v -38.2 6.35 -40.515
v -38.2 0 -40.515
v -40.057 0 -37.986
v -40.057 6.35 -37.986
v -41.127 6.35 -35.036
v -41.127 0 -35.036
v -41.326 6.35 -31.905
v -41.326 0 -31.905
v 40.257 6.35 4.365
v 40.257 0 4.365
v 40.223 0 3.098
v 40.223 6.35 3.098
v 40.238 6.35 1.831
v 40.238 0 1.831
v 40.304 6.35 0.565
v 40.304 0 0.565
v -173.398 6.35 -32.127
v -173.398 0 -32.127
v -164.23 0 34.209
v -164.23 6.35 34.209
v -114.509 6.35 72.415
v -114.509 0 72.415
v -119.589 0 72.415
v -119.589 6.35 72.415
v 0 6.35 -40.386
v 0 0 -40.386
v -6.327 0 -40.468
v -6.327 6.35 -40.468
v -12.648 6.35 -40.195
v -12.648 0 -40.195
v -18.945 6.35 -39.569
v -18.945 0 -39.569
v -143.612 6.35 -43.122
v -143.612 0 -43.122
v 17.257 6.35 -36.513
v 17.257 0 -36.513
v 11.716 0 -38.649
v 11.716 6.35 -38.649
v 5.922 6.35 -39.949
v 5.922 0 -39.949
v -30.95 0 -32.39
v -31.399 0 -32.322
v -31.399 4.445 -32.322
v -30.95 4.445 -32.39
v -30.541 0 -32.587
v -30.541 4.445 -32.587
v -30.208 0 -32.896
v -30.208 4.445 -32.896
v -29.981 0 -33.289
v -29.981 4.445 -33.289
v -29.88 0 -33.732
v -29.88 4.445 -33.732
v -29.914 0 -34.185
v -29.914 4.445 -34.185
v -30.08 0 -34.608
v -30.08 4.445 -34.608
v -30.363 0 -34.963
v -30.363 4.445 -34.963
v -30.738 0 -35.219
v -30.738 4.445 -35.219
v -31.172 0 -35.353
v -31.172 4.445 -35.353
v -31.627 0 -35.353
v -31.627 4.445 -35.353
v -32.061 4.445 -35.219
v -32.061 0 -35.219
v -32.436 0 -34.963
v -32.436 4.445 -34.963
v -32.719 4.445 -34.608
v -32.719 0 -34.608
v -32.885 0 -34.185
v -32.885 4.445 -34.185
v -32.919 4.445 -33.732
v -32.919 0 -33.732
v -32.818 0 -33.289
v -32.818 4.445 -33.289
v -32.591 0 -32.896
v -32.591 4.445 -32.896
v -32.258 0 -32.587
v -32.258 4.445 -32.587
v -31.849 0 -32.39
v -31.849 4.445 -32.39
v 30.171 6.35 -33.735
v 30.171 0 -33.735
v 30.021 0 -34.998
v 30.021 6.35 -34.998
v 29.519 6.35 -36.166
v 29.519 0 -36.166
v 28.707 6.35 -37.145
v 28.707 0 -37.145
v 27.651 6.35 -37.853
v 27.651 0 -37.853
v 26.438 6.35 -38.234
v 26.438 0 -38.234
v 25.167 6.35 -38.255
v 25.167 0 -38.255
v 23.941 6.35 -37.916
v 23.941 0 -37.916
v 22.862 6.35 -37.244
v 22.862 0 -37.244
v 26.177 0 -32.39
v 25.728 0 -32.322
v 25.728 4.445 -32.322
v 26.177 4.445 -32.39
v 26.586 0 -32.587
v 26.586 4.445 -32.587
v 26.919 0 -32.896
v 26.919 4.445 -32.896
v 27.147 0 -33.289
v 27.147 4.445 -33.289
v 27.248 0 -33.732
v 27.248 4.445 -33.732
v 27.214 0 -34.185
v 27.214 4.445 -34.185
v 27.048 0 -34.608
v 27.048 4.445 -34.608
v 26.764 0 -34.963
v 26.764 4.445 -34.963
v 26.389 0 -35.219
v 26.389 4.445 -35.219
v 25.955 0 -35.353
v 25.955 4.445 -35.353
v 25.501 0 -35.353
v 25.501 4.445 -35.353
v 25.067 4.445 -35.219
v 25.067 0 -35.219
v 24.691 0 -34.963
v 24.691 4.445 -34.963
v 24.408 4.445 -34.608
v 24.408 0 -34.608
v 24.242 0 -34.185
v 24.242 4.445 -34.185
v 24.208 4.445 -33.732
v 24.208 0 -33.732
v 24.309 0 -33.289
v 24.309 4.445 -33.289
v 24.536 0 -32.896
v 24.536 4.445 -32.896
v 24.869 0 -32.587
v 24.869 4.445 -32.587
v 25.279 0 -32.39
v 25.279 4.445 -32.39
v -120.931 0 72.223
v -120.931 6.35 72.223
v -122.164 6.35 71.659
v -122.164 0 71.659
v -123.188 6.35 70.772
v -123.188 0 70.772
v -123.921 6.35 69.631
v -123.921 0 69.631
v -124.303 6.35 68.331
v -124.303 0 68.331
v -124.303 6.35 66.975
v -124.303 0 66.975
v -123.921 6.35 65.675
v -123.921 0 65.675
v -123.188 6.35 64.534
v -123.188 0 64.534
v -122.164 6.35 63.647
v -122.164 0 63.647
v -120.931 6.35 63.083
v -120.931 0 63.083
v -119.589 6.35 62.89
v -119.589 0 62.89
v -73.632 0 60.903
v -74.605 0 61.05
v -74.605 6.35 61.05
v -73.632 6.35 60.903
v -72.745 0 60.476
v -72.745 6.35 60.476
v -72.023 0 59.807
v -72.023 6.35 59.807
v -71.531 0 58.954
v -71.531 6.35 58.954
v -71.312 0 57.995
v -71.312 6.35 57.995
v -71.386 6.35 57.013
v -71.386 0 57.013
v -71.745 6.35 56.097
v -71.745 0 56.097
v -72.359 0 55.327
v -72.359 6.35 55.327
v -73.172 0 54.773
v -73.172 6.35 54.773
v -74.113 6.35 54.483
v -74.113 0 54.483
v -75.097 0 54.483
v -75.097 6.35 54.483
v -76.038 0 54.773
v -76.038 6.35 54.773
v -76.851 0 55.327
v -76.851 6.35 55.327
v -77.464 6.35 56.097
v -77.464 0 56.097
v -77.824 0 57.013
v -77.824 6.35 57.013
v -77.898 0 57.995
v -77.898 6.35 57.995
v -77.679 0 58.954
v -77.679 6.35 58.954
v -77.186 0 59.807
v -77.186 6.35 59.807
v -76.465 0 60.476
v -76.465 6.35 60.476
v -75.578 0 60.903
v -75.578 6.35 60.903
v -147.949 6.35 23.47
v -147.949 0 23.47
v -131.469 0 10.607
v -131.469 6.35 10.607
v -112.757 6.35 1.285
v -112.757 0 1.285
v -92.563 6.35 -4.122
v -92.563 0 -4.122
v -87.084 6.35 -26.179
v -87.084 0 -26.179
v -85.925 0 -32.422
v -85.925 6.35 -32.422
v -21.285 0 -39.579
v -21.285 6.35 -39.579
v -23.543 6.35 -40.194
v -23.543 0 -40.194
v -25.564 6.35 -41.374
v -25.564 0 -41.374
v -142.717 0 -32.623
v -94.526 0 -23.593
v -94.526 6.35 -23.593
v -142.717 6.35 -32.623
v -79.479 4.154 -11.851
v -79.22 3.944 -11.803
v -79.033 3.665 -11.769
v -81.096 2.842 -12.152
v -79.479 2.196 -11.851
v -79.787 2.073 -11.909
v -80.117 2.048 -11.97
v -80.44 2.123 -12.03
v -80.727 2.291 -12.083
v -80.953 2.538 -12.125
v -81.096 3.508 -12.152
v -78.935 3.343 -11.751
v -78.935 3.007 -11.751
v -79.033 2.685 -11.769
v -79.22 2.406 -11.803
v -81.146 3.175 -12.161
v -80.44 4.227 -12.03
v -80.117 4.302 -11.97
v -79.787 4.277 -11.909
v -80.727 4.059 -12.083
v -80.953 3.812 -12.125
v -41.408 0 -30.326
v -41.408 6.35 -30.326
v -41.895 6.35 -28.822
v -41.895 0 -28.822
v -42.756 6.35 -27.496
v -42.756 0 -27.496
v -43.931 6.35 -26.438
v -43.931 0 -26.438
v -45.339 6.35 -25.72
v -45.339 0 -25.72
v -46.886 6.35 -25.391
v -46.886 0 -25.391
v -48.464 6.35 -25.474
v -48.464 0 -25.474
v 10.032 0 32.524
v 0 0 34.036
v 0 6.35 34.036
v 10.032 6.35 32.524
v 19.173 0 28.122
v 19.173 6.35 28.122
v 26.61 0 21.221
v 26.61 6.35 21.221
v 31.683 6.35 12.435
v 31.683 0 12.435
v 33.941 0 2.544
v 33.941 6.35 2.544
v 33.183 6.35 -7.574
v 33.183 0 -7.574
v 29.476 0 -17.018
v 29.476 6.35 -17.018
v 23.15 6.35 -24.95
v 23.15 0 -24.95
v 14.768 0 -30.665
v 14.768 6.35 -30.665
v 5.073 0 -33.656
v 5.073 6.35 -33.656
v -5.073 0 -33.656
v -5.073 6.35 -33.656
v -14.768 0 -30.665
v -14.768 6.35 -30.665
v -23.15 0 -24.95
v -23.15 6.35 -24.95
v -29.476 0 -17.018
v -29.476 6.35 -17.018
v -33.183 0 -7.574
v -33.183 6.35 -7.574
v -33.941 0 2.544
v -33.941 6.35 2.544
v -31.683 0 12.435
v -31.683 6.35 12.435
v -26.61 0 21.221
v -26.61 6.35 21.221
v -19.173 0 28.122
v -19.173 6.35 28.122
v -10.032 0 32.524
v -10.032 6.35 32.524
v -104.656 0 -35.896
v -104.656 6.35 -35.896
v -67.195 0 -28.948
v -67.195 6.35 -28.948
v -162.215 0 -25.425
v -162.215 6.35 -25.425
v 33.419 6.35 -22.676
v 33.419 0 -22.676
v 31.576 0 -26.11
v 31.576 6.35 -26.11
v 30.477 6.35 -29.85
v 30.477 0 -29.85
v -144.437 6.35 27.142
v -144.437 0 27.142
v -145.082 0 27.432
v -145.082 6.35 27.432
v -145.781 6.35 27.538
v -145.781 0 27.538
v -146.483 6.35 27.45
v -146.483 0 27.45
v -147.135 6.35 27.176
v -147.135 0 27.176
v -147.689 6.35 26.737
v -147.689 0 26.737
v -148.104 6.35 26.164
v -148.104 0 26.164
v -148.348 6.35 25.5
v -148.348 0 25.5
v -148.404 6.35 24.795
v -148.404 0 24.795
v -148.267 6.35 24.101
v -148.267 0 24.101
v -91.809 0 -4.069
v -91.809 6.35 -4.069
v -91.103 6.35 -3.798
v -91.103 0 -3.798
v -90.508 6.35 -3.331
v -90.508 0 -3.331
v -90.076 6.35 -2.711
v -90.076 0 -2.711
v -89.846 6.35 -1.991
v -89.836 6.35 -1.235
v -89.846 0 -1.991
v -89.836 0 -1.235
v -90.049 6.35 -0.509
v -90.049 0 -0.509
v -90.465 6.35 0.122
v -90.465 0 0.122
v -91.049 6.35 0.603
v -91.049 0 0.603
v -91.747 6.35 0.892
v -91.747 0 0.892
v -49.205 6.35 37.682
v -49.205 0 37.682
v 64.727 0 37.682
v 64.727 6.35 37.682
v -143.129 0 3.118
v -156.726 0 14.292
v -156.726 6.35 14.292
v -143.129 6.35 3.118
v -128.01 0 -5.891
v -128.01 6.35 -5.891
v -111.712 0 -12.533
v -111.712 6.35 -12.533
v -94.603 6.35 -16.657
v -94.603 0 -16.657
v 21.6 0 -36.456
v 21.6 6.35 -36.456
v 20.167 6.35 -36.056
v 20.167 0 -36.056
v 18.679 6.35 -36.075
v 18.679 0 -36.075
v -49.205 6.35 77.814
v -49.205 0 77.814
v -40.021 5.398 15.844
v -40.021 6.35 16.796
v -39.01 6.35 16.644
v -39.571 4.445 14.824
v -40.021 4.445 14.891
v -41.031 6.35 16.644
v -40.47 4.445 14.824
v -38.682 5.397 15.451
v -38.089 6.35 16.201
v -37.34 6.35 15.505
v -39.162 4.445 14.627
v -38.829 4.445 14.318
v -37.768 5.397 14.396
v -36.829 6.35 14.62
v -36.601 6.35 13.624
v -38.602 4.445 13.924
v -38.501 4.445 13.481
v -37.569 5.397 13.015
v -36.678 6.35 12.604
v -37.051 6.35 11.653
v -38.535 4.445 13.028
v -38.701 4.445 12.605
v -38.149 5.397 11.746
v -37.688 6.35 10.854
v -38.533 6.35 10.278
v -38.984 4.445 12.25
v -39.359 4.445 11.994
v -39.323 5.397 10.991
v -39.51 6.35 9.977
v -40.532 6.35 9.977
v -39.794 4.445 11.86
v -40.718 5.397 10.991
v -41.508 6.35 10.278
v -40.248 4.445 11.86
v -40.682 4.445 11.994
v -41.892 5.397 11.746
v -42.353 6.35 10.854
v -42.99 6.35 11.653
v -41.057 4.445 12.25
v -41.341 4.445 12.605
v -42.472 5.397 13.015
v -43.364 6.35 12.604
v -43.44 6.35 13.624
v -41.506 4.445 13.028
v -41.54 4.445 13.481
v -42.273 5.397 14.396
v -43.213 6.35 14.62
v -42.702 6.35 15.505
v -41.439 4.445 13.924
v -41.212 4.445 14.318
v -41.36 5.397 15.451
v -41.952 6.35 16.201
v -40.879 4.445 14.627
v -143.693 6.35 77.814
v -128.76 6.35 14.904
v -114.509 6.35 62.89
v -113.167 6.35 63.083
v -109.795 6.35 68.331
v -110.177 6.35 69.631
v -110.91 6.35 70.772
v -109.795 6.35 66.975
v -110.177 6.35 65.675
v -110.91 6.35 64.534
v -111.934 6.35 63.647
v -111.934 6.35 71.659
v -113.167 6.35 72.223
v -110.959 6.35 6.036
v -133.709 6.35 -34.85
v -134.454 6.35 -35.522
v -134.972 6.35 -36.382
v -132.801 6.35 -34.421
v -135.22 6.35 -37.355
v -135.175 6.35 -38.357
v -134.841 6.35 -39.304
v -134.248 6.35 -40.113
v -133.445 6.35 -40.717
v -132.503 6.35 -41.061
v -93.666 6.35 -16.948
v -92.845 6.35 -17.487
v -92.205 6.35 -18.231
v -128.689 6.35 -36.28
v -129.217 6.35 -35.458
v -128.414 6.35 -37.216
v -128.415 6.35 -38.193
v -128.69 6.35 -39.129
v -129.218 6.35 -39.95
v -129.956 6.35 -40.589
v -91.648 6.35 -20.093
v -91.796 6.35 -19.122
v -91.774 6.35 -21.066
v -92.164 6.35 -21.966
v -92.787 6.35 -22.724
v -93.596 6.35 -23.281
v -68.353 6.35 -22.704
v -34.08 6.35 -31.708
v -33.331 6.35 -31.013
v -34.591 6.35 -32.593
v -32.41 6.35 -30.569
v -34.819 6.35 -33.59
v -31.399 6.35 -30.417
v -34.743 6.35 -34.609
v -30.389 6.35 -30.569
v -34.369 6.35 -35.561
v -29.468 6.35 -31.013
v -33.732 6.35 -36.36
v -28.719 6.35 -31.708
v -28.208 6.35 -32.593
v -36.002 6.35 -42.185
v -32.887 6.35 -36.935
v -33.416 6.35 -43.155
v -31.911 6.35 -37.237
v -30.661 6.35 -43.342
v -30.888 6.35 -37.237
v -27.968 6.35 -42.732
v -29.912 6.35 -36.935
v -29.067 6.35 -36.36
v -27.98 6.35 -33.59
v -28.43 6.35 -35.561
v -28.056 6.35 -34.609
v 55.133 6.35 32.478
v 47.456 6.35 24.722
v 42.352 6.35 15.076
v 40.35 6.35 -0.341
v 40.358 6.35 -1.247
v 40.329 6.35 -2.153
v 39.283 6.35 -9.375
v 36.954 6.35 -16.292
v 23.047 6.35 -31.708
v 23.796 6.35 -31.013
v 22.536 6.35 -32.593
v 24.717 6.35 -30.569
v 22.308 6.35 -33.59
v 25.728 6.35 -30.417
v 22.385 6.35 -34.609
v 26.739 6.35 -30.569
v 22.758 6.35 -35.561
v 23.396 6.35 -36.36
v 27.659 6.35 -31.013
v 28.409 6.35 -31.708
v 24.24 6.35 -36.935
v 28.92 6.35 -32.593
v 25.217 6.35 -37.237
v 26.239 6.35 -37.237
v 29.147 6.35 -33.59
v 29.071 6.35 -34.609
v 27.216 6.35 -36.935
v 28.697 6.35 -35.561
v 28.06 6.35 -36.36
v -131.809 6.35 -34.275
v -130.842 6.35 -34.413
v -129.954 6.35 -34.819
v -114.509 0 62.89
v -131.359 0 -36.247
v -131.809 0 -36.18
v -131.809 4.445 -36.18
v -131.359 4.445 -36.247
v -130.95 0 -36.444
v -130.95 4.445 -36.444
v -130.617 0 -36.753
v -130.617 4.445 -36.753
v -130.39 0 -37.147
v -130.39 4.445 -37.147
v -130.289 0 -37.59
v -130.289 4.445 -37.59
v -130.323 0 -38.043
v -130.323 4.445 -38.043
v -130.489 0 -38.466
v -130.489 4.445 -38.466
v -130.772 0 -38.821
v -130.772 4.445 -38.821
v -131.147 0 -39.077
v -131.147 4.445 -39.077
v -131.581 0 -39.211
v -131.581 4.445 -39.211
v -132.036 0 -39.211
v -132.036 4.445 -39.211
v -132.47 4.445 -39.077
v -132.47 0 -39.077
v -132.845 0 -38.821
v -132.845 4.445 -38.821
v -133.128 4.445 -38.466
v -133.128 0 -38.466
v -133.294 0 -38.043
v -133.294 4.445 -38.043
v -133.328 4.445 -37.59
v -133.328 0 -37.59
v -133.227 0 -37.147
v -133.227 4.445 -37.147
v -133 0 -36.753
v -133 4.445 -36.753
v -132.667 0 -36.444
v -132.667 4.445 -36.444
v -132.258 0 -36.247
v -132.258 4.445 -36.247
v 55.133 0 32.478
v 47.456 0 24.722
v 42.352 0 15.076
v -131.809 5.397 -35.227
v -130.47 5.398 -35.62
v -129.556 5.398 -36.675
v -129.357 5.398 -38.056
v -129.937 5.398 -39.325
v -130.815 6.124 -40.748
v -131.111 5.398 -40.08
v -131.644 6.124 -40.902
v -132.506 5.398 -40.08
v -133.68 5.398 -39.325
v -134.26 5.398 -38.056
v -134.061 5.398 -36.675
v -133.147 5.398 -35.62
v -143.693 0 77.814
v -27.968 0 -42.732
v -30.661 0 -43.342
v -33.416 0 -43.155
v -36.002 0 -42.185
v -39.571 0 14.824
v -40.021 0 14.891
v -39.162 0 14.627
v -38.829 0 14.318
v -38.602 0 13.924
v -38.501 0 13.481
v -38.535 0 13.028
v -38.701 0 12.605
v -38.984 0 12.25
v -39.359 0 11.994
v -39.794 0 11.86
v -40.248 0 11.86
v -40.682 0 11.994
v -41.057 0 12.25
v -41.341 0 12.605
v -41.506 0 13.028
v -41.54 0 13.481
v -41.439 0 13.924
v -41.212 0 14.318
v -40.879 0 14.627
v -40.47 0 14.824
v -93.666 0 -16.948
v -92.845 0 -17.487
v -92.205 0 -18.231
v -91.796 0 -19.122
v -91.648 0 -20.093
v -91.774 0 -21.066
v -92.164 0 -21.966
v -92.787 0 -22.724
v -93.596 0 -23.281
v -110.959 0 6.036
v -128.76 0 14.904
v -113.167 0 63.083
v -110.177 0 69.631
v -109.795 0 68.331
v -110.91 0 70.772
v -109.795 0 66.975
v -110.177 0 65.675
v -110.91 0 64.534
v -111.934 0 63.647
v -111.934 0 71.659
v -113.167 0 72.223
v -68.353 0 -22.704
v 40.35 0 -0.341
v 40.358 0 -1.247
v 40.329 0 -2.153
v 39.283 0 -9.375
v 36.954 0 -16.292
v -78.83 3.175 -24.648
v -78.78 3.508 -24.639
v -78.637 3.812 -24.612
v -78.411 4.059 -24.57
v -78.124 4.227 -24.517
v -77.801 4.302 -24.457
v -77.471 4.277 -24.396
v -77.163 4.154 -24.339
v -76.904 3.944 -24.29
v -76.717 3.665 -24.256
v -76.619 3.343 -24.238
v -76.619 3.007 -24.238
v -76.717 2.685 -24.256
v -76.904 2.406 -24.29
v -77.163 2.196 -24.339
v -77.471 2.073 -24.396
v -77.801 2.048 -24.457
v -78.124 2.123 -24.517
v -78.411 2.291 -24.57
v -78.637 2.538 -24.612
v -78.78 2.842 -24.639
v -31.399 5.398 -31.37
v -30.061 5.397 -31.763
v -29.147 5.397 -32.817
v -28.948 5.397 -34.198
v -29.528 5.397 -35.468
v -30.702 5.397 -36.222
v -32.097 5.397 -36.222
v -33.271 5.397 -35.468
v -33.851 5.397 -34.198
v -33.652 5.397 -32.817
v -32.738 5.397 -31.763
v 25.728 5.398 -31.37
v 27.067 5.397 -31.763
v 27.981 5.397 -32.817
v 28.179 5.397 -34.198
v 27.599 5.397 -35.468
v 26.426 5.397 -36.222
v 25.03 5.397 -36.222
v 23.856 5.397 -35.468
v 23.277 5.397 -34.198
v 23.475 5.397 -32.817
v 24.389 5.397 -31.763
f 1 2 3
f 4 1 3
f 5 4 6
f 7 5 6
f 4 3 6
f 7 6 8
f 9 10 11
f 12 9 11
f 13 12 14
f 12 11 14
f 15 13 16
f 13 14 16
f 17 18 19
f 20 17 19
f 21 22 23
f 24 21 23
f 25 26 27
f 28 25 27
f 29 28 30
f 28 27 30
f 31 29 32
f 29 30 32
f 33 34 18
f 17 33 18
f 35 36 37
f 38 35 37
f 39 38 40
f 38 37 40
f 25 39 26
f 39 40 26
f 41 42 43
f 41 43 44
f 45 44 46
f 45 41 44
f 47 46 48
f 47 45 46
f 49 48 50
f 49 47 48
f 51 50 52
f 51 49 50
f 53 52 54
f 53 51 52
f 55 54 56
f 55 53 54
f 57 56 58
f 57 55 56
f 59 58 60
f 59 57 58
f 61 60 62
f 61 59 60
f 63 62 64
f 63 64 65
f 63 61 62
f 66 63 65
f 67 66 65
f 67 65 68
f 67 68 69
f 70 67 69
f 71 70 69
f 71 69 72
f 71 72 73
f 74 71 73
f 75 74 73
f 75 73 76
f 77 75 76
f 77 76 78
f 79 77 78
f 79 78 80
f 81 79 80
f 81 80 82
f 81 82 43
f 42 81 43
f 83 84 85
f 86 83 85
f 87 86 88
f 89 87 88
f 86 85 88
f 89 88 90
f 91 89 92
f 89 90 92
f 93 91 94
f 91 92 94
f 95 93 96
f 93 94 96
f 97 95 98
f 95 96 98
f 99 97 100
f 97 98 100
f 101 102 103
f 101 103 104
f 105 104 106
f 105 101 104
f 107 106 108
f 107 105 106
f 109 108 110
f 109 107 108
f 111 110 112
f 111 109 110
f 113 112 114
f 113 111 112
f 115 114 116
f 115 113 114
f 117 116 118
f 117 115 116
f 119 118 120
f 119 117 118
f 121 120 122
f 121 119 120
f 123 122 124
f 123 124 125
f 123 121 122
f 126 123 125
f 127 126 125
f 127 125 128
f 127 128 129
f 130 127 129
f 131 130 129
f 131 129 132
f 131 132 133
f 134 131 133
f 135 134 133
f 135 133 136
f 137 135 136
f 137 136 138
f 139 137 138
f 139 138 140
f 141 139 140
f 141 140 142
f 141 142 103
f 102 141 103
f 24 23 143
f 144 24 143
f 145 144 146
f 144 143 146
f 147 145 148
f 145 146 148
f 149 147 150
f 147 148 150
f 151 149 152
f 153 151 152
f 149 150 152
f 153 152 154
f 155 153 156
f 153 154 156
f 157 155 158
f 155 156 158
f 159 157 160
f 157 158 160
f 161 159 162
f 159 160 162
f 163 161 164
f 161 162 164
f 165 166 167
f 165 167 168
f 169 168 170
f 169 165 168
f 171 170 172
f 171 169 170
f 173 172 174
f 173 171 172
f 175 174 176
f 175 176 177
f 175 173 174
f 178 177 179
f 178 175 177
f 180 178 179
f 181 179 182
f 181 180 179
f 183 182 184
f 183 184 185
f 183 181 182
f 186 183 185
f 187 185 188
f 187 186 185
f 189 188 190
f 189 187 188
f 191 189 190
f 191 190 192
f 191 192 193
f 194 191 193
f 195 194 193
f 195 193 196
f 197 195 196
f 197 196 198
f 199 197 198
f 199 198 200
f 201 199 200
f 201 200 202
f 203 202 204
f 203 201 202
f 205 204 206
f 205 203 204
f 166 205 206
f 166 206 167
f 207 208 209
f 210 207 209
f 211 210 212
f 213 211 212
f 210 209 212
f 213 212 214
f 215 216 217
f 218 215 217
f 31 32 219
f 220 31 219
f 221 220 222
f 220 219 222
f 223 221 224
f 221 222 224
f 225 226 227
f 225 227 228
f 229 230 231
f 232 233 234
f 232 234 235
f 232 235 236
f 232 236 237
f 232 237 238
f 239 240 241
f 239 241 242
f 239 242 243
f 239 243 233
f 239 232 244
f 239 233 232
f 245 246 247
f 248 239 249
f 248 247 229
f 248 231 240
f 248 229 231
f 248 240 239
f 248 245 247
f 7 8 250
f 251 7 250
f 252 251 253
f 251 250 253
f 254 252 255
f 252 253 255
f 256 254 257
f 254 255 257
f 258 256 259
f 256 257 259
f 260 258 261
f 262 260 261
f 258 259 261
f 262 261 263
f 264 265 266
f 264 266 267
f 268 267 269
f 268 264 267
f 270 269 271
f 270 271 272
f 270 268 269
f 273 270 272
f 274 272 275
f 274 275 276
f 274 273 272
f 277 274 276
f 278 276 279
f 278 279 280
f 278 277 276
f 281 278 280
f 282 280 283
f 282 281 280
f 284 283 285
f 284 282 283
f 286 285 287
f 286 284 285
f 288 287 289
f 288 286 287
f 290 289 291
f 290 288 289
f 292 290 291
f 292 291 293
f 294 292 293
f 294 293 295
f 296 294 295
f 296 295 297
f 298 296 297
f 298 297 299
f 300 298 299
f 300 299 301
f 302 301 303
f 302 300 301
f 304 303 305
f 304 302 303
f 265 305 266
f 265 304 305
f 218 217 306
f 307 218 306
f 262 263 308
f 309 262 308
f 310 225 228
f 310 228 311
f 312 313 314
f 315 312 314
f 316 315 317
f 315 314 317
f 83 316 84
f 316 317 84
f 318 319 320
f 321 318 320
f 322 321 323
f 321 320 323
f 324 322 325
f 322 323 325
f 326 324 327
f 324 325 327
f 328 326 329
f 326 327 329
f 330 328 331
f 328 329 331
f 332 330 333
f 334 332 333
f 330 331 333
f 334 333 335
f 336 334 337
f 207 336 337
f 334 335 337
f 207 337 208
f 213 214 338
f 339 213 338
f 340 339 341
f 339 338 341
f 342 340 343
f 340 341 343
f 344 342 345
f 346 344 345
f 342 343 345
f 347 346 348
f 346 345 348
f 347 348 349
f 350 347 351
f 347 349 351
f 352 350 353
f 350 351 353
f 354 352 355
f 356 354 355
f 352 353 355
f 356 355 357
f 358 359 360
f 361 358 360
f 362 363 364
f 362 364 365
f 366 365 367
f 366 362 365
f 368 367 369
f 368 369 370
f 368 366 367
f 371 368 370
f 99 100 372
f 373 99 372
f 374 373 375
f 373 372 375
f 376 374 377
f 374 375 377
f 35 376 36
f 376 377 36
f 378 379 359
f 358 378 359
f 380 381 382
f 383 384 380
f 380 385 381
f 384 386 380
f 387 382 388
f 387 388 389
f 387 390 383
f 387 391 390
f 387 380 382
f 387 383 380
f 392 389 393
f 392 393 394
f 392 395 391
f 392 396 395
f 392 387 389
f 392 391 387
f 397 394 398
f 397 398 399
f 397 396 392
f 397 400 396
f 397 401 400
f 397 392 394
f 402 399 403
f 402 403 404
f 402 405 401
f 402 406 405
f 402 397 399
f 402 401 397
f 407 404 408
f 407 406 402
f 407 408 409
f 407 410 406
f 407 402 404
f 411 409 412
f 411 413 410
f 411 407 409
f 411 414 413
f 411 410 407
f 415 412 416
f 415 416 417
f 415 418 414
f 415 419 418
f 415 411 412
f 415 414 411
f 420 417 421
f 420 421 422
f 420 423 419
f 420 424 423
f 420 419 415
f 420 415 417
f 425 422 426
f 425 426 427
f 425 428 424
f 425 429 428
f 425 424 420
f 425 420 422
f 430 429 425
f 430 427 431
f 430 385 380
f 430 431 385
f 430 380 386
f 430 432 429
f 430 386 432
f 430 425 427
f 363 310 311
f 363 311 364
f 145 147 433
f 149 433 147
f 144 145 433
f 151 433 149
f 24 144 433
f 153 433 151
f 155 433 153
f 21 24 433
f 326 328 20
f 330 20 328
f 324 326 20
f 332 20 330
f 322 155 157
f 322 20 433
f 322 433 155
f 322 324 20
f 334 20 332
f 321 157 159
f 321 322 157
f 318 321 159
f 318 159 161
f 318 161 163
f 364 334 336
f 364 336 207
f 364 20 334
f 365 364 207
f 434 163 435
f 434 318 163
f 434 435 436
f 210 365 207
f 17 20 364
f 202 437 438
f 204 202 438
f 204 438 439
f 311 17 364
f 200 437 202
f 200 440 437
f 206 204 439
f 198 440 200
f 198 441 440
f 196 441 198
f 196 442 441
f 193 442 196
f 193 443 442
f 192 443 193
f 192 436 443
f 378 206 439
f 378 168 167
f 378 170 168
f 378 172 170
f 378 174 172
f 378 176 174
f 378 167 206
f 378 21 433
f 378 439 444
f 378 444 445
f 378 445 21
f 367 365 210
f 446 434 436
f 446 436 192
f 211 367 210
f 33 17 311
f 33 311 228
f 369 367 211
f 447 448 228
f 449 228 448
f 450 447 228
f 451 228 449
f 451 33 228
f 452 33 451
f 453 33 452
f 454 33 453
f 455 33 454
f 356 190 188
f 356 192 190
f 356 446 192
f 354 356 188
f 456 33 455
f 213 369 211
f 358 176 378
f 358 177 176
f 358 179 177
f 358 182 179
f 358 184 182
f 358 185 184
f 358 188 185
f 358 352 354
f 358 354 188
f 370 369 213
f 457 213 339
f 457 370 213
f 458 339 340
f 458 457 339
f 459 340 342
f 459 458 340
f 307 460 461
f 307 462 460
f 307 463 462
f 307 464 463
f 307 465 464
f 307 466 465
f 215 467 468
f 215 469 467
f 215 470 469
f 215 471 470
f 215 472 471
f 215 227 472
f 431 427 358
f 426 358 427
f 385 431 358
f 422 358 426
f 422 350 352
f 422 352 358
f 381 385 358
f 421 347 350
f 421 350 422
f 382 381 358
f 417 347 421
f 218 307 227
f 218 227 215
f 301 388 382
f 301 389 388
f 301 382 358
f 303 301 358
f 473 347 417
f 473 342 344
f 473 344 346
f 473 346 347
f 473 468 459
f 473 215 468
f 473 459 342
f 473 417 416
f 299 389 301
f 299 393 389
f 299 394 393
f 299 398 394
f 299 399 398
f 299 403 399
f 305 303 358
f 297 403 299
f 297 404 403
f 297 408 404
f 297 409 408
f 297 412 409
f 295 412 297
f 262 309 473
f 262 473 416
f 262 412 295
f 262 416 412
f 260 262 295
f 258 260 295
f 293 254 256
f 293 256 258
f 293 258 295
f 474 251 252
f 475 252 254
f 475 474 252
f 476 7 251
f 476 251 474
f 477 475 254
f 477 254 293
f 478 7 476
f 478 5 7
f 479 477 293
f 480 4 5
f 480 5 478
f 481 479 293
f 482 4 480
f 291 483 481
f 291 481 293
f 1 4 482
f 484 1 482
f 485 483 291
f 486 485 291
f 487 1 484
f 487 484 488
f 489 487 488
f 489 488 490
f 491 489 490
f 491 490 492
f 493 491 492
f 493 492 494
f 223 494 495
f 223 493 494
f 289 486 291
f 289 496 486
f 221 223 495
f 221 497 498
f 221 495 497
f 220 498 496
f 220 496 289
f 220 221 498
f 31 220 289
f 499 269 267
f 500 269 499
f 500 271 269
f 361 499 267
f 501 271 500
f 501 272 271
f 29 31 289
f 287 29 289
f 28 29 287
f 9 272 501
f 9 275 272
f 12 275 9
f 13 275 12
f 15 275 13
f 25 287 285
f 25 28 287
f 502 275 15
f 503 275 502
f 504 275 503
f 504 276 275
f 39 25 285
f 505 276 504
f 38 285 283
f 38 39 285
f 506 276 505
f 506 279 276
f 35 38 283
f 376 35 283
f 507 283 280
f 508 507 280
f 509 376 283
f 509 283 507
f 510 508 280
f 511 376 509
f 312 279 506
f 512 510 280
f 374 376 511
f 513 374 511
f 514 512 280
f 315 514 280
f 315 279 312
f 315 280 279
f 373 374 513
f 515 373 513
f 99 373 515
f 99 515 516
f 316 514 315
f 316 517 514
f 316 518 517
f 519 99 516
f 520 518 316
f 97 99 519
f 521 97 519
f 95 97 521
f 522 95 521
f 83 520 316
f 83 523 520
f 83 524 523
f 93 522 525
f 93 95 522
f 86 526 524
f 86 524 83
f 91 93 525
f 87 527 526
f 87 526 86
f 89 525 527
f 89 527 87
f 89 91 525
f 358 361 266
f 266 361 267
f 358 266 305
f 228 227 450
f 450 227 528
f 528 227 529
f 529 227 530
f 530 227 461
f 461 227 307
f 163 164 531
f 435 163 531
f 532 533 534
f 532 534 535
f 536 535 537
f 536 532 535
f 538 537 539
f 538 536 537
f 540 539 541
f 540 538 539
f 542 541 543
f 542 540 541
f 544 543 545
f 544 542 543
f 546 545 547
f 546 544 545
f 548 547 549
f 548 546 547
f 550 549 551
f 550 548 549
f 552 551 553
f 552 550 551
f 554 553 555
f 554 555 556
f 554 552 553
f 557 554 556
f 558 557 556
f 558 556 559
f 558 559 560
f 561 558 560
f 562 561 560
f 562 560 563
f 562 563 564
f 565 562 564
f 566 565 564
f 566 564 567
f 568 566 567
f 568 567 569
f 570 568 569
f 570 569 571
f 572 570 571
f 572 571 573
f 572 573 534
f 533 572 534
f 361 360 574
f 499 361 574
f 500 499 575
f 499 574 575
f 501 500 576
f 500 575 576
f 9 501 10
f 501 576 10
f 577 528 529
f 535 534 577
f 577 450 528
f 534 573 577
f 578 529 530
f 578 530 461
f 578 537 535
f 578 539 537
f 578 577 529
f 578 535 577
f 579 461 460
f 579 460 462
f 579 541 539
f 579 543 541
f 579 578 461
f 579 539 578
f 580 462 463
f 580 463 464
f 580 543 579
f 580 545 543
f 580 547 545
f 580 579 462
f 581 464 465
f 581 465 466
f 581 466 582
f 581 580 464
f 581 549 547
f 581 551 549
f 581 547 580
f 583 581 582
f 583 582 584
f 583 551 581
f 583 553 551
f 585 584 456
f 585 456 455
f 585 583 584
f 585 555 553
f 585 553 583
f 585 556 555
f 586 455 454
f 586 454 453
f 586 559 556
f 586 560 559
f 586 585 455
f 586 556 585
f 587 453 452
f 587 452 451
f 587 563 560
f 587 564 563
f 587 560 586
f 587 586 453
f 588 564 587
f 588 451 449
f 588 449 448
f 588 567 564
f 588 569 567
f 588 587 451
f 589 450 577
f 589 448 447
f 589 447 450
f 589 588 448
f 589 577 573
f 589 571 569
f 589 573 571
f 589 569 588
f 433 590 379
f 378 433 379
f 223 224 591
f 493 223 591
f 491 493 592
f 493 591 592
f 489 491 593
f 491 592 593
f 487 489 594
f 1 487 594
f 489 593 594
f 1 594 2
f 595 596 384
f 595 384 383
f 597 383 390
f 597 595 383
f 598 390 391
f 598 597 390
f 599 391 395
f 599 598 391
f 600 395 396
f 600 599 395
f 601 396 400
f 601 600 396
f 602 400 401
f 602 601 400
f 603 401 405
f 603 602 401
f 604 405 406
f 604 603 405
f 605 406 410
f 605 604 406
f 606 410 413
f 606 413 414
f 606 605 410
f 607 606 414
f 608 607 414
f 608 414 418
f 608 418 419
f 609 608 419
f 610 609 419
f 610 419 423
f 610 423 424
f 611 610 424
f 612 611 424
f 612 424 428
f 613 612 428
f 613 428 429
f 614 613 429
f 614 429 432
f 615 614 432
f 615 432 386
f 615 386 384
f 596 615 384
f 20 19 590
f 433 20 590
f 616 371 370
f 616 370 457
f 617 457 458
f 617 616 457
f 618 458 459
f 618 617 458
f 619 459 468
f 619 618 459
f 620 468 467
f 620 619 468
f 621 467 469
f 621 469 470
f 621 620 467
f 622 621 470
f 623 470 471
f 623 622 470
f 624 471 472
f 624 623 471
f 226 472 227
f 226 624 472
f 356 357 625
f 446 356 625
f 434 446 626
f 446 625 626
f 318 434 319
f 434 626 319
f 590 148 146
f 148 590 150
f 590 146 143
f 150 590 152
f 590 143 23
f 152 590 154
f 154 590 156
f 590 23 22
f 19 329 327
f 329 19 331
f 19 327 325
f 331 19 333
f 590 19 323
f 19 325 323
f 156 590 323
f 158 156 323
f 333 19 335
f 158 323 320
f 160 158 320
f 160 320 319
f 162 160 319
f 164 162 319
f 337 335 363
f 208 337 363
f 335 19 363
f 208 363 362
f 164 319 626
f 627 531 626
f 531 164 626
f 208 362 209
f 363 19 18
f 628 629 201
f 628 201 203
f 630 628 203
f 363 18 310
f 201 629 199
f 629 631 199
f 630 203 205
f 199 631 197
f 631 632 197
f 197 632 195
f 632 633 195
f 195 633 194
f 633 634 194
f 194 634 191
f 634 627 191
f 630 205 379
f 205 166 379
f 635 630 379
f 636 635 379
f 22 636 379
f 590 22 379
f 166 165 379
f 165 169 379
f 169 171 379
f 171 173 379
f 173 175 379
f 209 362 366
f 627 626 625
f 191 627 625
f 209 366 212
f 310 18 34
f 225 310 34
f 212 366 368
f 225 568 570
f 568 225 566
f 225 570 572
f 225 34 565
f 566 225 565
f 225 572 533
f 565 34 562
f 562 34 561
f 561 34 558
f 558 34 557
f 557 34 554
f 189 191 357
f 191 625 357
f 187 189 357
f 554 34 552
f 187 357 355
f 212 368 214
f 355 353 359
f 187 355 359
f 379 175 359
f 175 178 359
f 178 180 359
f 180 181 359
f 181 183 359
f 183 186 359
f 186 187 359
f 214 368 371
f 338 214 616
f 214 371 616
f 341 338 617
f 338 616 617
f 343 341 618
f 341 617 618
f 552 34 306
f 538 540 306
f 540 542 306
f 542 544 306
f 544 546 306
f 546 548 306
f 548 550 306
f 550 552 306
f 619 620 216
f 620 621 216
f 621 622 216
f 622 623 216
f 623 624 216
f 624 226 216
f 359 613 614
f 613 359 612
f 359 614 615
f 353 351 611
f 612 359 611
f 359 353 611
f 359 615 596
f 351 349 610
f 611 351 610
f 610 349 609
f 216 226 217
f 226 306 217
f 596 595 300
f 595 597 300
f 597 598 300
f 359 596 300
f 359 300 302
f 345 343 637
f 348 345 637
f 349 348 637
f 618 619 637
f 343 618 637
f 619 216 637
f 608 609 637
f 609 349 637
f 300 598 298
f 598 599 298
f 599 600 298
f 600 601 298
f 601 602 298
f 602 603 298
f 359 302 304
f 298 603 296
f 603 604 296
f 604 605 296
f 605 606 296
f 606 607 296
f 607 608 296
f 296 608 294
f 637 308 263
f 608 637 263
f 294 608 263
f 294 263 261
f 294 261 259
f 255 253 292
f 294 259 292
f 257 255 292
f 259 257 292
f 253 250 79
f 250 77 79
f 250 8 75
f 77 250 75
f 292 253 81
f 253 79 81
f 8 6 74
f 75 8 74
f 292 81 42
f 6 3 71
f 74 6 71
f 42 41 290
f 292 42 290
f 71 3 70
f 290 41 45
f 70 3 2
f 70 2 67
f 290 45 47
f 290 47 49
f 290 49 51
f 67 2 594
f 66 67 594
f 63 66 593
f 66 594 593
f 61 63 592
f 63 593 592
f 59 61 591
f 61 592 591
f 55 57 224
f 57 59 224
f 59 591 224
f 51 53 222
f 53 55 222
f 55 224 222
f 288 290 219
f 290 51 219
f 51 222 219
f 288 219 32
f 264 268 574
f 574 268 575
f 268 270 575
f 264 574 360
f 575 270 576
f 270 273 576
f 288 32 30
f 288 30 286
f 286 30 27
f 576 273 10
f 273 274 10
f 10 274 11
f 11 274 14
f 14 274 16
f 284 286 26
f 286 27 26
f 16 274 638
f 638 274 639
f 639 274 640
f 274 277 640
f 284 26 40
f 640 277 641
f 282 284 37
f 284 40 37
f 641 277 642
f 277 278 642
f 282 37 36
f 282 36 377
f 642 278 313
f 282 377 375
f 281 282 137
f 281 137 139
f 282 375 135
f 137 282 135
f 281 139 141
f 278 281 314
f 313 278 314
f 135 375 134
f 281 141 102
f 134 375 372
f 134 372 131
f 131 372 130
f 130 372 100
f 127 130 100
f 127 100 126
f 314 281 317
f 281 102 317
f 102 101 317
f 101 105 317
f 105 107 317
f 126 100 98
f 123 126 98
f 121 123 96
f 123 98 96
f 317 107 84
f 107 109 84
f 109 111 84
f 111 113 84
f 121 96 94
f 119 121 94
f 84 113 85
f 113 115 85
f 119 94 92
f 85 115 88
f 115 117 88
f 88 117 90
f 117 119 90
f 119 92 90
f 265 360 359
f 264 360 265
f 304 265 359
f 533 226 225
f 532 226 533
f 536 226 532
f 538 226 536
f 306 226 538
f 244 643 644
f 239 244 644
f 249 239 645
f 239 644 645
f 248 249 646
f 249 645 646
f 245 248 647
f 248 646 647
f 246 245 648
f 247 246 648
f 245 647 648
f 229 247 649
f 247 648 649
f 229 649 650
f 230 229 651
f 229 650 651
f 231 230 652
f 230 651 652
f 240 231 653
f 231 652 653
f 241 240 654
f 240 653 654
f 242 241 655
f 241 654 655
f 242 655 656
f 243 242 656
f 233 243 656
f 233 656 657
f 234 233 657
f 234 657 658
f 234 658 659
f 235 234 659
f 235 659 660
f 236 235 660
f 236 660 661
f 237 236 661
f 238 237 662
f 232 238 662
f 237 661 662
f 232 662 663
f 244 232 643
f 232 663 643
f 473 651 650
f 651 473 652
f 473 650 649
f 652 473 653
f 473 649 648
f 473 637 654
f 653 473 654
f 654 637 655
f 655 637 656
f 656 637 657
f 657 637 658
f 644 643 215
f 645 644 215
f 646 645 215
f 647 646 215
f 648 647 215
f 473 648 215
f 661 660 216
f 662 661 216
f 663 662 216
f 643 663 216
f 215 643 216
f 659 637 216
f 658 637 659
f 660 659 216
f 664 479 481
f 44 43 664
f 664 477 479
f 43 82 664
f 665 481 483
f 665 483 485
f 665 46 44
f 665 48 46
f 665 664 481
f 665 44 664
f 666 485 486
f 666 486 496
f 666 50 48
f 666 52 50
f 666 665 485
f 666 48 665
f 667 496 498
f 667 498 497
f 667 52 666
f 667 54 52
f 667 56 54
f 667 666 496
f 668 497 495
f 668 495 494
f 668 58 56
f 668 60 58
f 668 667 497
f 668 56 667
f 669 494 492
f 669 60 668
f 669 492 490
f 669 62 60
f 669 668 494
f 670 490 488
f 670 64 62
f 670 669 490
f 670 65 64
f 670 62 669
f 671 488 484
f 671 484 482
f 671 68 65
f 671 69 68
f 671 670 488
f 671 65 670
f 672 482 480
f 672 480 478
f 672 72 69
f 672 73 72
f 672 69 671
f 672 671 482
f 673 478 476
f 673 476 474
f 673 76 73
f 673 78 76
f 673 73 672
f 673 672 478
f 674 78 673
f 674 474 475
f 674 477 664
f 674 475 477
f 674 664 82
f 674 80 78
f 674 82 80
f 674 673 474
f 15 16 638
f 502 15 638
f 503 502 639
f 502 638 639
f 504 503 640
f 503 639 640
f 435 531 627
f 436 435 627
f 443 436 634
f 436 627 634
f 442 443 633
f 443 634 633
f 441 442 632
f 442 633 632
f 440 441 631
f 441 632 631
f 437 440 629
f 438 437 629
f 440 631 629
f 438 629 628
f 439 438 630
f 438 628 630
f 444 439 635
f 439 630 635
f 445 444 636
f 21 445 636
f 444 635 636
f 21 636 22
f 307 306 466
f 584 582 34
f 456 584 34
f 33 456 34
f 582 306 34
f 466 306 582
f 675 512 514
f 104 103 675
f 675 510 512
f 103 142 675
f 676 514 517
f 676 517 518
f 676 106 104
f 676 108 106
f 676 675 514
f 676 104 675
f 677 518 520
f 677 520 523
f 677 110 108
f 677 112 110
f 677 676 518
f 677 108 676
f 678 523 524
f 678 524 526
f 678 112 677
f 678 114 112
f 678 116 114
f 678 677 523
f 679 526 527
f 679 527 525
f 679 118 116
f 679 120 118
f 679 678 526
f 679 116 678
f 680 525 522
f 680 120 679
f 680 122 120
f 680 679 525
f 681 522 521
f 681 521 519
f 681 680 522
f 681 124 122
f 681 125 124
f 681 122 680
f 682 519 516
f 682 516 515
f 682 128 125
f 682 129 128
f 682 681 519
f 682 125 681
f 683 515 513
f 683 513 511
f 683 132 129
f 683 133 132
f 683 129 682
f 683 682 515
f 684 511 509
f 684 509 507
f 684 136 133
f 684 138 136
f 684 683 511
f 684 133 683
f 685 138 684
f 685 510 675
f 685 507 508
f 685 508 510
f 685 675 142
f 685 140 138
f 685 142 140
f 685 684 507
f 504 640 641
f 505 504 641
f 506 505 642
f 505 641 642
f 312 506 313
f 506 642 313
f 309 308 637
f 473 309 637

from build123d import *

# Parameters (mm, degrees)
SKETCH1_R           = 34.036
SKETCH1_R_2         = 1.524
SKETCH1_R_3         = 3.302
BOSS_EXTRUDE1_DEPTH = 6.35
CHAMFER1_SIZE       = 1.905
SKETCH2_R           = 1.1303
CUT_EXTRUDE1_DEPTH  = 12.7


with BuildPart() as part:
    # Sketch1 → Boss-Extrude1 (new body)
    with BuildSketch(Plane(origin=(0, 0, 0), x_dir=(1, 0, 0), z_dir=(0, 1, 0))):
        with BuildLine():
            Line((-48.464441263, 25.473804408), (-67.194964824, 28.947993109))
            Line((-67.194964824, 28.947993109), (-68.353027724, 22.704485256))
            Line((-68.353027724, 22.704485256), (-87.083551285, 26.178673957))
            Line((-87.083551285, 26.178673957), (-85.925488385, 32.42218181))
            Line((-85.925488385, 32.42218181), (-104.656011946, 35.896370512))
            Line((-104.656011946, 35.896370512), (-123.386535507, 39.370559213))
            Line((-123.386535507, 39.370559213), (-143.61245558, 43.122118146))
            Line((-143.61245558, 43.122118146), (-173.397808446, 32.12688033))
            Line((-173.397808446, 32.12688033), (-164.230158466, -34.209448348))
            Line((-164.230158466, -34.209448348), (-143.692879271, -77.813892282))
            Line((-143.692879271, -77.813892282), (-76.563330949, -77.813892282))
            Line((-76.563330949, -77.813892282), (-49.204879271, -77.813892282))
            Line((-49.204879271, -77.813892282), (-49.204879271, -37.681892282))
            Line((-49.204879271, -37.681892282), (45.277962712, -37.681892282))
            Line((45.277962712, -37.681892282), (64.72671994, -37.681892282))
            ThreePointArc((64.72671994, -37.681892282), (47.456106683, -24.721818432), (40.256527969, -4.364911427))
            ThreePointArc((40.256527969, -4.364911427), (40.224315343, -2.464216219), (40.304028245, -0.564920092))
            ThreePointArc((40.304028245, -0.564920092), (40.358687129, 0.79375425), (40.328560009, 2.153193811))
            ThreePointArc((40.328560009, 2.153193811), (38.274981353, 12.886225143), (33.41911498, 22.675796567))
            ThreePointArc((33.41911498, 22.675796567), (30.929713329, 27.951337515), (30.171477502, 33.73524029))
            ThreePointArc((30.171477502, 33.73524029), (27.651370412, 37.853265988), (22.862043617, 37.243820127))
            ThreePointArc((22.862043617, 37.243820127), (20.166682607, 36.055874133), (17.256896531, 36.513401897))
            ThreePointArc((17.256896531, 36.513401897), (8.843040964, 39.405959226), (0, 40.386))
            ThreePointArc((0, 40.386), (-9.489488111, 40.375548652), (-18.94466273, 39.569219451))
            ThreePointArc((-18.94466273, 39.569219451), (-22.43398811, 39.812343861), (-25.563809609, 41.373983535))
            ThreePointArc((-25.563809609, 41.373983535), (-32.045487778, 43.349075748), (-38.20024979, 40.514989348))
            ThreePointArc((-38.20024979, 40.514989348), (-40.697264896, 36.549064779), (-41.325740518, 31.904857578))
            ThreePointArc((-41.325740518, 31.904857578), (-43.308574881, 26.928241056), (-48.464441263, 25.473804408))
        make_face()
        with Locations(Location((0, 0, 0), (0, 0, 270))):
            Circle(SKETCH1_R, mode=Mode.SUBTRACT)
        with Locations(Location((-31.399492492, 33.846007028, 0), (0, 0, 270))):
            Circle(SKETCH1_R_2, mode=Mode.SUBTRACT)
        with Locations(Location((-74.604879271, -57.747892282, 0), (0, 0, 270))):
            Circle(SKETCH1_R_3, mode=Mode.SUBTRACT)
        with Locations(Location((-40.020695033, -13.367428306, 0), (0, 0, 270))):
            Circle(SKETCH1_R_2, mode=Mode.SUBTRACT)
        with Locations(Location((-131.808500509, 37.703534036, 0), (0, 0, 270))):
            Circle(SKETCH1_R_2, mode=Mode.SUBTRACT)
        with Locations(Location((25.727857837, 33.846007028, 0), (0, 0, 270))):
            Circle(SKETCH1_R_2, mode=Mode.SUBTRACT)
        with BuildLine():
            Line((-142.716614997, 32.622661546), (-162.215024971, 25.424839997))
            Line((-162.215024971, 25.424839997), (-156.726187502, -14.291916989))
            ThreePointArc((-156.726187502, -14.291916989), (-128.010283659, 5.891204619), (-94.602827713, 16.657049623))
            ThreePointArc((-94.602827713, 16.657049623), (-91.648252867, 20.09262068), (-94.526212577, 23.592621954))
            Line((-94.526212577, 23.592621954), (-142.716614997, 32.622661546))
        make_face(mode=Mode.SUBTRACT)
        with BuildLine():
            Line((-114.508797405, -72.415483536), (-119.588797405, -72.415483536))
            ThreePointArc((-119.588797405, -72.415483536), (-124.351297405, -67.652983536), (-119.588797405, -62.890483536))
            Line((-119.588797405, -62.890483536), (-114.508797405, -62.890483536))
            ThreePointArc((-114.508797405, -62.890483536), (-109.746297405, -67.652983536), (-114.508797405, -72.415483536))
        make_face(mode=Mode.SUBTRACT)
        with BuildLine():
            ThreePointArc((-147.948535824, -23.470306336), (-122.347176599, -5.47625853), (-92.563113904, 4.121916294))
            ThreePointArc((-92.563113904, 4.121916294), (-89.845720269, 1.990682905), (-91.74722838, -0.892137038))
            ThreePointArc((-91.74722838, -0.892137038), (-120.081933775, -10.023243789), (-144.437475152, -27.141662075))
            ThreePointArc((-144.437475152, -27.141662075), (-147.689154448, -26.736809805), (-147.948535824, -23.470306336))
        make_face(mode=Mode.SUBTRACT)
    extrude(amount=BOSS_EXTRUDE1_DEPTH)

    # Chamfer1
    # the kernel refuses this chamfer: 1.905 mm, written as the material it takes off along each edge
    with BuildSketch(Plane(origin=(-40.020695033, 6.35, 13.367428306), x_dir=(0, 0, 1), z_dir=(-1, 0, 0))) as chamfer1_piece_1:
        Polygon((1.524 + CHAMFER1_SIZE, 0), (1.524, -CHAMFER1_SIZE), (1.524, 0), align=None)
    revolve(axis=Axis((-40.020695033, 6.35, 13.367428306), (0, 1, 0)), mode=Mode.SUBTRACT)
    with BuildSketch(Plane(origin=(-131.808500509, 6.35, -37.703534036), x_dir=(0, 0, 1), z_dir=(-1, 0, 0))) as chamfer1_piece_2:
        Polygon((1.524 + CHAMFER1_SIZE, 0), (1.524, -CHAMFER1_SIZE), (1.524, 0), align=None)
    revolve(axis=Axis((-131.808500509, 6.35, -37.703534036), (0, 1, 0)), mode=Mode.SUBTRACT)
    with BuildSketch(Plane(origin=(25.727857837, 6.35, -33.846007028), x_dir=(0, 0, 1), z_dir=(-1, 0, 0))) as chamfer1_piece_3:
        Polygon((1.524 + CHAMFER1_SIZE, 0), (1.524, -CHAMFER1_SIZE), (1.524, 0), align=None)
    revolve(axis=Axis((25.727857837, 6.35, -33.846007028), (0, 1, 0)), mode=Mode.SUBTRACT)
    with BuildSketch(Plane(origin=(-31.399492492, 6.35, -33.846007028), x_dir=(0, 0, 1), z_dir=(-1, 0, 0))) as chamfer1_piece_4:
        Polygon((1.524 + CHAMFER1_SIZE, 0), (1.524, -CHAMFER1_SIZE), (1.524, 0), align=None)
    revolve(axis=Axis((-31.399492492, 6.35, -33.846007028), (0, 1, 0)), mode=Mode.SUBTRACT)

    # Sketch2 → Cut-Extrude1 (cut)
    with BuildSketch(Plane(origin=(1.797830768, 0, -9.692712298), x_dir=(-0.9832295832535878, 0, -0.18237211029917974), z_dir=(0.18237211029917974, 0, -0.9832295832535878))):
        with Locations((80.872383853, 3.175)):
            Circle(SKETCH2_R)
    extrude(amount=-CUT_EXTRUDE1_DEPTH, mode=Mode.SUBTRACT)


solid = part.part
